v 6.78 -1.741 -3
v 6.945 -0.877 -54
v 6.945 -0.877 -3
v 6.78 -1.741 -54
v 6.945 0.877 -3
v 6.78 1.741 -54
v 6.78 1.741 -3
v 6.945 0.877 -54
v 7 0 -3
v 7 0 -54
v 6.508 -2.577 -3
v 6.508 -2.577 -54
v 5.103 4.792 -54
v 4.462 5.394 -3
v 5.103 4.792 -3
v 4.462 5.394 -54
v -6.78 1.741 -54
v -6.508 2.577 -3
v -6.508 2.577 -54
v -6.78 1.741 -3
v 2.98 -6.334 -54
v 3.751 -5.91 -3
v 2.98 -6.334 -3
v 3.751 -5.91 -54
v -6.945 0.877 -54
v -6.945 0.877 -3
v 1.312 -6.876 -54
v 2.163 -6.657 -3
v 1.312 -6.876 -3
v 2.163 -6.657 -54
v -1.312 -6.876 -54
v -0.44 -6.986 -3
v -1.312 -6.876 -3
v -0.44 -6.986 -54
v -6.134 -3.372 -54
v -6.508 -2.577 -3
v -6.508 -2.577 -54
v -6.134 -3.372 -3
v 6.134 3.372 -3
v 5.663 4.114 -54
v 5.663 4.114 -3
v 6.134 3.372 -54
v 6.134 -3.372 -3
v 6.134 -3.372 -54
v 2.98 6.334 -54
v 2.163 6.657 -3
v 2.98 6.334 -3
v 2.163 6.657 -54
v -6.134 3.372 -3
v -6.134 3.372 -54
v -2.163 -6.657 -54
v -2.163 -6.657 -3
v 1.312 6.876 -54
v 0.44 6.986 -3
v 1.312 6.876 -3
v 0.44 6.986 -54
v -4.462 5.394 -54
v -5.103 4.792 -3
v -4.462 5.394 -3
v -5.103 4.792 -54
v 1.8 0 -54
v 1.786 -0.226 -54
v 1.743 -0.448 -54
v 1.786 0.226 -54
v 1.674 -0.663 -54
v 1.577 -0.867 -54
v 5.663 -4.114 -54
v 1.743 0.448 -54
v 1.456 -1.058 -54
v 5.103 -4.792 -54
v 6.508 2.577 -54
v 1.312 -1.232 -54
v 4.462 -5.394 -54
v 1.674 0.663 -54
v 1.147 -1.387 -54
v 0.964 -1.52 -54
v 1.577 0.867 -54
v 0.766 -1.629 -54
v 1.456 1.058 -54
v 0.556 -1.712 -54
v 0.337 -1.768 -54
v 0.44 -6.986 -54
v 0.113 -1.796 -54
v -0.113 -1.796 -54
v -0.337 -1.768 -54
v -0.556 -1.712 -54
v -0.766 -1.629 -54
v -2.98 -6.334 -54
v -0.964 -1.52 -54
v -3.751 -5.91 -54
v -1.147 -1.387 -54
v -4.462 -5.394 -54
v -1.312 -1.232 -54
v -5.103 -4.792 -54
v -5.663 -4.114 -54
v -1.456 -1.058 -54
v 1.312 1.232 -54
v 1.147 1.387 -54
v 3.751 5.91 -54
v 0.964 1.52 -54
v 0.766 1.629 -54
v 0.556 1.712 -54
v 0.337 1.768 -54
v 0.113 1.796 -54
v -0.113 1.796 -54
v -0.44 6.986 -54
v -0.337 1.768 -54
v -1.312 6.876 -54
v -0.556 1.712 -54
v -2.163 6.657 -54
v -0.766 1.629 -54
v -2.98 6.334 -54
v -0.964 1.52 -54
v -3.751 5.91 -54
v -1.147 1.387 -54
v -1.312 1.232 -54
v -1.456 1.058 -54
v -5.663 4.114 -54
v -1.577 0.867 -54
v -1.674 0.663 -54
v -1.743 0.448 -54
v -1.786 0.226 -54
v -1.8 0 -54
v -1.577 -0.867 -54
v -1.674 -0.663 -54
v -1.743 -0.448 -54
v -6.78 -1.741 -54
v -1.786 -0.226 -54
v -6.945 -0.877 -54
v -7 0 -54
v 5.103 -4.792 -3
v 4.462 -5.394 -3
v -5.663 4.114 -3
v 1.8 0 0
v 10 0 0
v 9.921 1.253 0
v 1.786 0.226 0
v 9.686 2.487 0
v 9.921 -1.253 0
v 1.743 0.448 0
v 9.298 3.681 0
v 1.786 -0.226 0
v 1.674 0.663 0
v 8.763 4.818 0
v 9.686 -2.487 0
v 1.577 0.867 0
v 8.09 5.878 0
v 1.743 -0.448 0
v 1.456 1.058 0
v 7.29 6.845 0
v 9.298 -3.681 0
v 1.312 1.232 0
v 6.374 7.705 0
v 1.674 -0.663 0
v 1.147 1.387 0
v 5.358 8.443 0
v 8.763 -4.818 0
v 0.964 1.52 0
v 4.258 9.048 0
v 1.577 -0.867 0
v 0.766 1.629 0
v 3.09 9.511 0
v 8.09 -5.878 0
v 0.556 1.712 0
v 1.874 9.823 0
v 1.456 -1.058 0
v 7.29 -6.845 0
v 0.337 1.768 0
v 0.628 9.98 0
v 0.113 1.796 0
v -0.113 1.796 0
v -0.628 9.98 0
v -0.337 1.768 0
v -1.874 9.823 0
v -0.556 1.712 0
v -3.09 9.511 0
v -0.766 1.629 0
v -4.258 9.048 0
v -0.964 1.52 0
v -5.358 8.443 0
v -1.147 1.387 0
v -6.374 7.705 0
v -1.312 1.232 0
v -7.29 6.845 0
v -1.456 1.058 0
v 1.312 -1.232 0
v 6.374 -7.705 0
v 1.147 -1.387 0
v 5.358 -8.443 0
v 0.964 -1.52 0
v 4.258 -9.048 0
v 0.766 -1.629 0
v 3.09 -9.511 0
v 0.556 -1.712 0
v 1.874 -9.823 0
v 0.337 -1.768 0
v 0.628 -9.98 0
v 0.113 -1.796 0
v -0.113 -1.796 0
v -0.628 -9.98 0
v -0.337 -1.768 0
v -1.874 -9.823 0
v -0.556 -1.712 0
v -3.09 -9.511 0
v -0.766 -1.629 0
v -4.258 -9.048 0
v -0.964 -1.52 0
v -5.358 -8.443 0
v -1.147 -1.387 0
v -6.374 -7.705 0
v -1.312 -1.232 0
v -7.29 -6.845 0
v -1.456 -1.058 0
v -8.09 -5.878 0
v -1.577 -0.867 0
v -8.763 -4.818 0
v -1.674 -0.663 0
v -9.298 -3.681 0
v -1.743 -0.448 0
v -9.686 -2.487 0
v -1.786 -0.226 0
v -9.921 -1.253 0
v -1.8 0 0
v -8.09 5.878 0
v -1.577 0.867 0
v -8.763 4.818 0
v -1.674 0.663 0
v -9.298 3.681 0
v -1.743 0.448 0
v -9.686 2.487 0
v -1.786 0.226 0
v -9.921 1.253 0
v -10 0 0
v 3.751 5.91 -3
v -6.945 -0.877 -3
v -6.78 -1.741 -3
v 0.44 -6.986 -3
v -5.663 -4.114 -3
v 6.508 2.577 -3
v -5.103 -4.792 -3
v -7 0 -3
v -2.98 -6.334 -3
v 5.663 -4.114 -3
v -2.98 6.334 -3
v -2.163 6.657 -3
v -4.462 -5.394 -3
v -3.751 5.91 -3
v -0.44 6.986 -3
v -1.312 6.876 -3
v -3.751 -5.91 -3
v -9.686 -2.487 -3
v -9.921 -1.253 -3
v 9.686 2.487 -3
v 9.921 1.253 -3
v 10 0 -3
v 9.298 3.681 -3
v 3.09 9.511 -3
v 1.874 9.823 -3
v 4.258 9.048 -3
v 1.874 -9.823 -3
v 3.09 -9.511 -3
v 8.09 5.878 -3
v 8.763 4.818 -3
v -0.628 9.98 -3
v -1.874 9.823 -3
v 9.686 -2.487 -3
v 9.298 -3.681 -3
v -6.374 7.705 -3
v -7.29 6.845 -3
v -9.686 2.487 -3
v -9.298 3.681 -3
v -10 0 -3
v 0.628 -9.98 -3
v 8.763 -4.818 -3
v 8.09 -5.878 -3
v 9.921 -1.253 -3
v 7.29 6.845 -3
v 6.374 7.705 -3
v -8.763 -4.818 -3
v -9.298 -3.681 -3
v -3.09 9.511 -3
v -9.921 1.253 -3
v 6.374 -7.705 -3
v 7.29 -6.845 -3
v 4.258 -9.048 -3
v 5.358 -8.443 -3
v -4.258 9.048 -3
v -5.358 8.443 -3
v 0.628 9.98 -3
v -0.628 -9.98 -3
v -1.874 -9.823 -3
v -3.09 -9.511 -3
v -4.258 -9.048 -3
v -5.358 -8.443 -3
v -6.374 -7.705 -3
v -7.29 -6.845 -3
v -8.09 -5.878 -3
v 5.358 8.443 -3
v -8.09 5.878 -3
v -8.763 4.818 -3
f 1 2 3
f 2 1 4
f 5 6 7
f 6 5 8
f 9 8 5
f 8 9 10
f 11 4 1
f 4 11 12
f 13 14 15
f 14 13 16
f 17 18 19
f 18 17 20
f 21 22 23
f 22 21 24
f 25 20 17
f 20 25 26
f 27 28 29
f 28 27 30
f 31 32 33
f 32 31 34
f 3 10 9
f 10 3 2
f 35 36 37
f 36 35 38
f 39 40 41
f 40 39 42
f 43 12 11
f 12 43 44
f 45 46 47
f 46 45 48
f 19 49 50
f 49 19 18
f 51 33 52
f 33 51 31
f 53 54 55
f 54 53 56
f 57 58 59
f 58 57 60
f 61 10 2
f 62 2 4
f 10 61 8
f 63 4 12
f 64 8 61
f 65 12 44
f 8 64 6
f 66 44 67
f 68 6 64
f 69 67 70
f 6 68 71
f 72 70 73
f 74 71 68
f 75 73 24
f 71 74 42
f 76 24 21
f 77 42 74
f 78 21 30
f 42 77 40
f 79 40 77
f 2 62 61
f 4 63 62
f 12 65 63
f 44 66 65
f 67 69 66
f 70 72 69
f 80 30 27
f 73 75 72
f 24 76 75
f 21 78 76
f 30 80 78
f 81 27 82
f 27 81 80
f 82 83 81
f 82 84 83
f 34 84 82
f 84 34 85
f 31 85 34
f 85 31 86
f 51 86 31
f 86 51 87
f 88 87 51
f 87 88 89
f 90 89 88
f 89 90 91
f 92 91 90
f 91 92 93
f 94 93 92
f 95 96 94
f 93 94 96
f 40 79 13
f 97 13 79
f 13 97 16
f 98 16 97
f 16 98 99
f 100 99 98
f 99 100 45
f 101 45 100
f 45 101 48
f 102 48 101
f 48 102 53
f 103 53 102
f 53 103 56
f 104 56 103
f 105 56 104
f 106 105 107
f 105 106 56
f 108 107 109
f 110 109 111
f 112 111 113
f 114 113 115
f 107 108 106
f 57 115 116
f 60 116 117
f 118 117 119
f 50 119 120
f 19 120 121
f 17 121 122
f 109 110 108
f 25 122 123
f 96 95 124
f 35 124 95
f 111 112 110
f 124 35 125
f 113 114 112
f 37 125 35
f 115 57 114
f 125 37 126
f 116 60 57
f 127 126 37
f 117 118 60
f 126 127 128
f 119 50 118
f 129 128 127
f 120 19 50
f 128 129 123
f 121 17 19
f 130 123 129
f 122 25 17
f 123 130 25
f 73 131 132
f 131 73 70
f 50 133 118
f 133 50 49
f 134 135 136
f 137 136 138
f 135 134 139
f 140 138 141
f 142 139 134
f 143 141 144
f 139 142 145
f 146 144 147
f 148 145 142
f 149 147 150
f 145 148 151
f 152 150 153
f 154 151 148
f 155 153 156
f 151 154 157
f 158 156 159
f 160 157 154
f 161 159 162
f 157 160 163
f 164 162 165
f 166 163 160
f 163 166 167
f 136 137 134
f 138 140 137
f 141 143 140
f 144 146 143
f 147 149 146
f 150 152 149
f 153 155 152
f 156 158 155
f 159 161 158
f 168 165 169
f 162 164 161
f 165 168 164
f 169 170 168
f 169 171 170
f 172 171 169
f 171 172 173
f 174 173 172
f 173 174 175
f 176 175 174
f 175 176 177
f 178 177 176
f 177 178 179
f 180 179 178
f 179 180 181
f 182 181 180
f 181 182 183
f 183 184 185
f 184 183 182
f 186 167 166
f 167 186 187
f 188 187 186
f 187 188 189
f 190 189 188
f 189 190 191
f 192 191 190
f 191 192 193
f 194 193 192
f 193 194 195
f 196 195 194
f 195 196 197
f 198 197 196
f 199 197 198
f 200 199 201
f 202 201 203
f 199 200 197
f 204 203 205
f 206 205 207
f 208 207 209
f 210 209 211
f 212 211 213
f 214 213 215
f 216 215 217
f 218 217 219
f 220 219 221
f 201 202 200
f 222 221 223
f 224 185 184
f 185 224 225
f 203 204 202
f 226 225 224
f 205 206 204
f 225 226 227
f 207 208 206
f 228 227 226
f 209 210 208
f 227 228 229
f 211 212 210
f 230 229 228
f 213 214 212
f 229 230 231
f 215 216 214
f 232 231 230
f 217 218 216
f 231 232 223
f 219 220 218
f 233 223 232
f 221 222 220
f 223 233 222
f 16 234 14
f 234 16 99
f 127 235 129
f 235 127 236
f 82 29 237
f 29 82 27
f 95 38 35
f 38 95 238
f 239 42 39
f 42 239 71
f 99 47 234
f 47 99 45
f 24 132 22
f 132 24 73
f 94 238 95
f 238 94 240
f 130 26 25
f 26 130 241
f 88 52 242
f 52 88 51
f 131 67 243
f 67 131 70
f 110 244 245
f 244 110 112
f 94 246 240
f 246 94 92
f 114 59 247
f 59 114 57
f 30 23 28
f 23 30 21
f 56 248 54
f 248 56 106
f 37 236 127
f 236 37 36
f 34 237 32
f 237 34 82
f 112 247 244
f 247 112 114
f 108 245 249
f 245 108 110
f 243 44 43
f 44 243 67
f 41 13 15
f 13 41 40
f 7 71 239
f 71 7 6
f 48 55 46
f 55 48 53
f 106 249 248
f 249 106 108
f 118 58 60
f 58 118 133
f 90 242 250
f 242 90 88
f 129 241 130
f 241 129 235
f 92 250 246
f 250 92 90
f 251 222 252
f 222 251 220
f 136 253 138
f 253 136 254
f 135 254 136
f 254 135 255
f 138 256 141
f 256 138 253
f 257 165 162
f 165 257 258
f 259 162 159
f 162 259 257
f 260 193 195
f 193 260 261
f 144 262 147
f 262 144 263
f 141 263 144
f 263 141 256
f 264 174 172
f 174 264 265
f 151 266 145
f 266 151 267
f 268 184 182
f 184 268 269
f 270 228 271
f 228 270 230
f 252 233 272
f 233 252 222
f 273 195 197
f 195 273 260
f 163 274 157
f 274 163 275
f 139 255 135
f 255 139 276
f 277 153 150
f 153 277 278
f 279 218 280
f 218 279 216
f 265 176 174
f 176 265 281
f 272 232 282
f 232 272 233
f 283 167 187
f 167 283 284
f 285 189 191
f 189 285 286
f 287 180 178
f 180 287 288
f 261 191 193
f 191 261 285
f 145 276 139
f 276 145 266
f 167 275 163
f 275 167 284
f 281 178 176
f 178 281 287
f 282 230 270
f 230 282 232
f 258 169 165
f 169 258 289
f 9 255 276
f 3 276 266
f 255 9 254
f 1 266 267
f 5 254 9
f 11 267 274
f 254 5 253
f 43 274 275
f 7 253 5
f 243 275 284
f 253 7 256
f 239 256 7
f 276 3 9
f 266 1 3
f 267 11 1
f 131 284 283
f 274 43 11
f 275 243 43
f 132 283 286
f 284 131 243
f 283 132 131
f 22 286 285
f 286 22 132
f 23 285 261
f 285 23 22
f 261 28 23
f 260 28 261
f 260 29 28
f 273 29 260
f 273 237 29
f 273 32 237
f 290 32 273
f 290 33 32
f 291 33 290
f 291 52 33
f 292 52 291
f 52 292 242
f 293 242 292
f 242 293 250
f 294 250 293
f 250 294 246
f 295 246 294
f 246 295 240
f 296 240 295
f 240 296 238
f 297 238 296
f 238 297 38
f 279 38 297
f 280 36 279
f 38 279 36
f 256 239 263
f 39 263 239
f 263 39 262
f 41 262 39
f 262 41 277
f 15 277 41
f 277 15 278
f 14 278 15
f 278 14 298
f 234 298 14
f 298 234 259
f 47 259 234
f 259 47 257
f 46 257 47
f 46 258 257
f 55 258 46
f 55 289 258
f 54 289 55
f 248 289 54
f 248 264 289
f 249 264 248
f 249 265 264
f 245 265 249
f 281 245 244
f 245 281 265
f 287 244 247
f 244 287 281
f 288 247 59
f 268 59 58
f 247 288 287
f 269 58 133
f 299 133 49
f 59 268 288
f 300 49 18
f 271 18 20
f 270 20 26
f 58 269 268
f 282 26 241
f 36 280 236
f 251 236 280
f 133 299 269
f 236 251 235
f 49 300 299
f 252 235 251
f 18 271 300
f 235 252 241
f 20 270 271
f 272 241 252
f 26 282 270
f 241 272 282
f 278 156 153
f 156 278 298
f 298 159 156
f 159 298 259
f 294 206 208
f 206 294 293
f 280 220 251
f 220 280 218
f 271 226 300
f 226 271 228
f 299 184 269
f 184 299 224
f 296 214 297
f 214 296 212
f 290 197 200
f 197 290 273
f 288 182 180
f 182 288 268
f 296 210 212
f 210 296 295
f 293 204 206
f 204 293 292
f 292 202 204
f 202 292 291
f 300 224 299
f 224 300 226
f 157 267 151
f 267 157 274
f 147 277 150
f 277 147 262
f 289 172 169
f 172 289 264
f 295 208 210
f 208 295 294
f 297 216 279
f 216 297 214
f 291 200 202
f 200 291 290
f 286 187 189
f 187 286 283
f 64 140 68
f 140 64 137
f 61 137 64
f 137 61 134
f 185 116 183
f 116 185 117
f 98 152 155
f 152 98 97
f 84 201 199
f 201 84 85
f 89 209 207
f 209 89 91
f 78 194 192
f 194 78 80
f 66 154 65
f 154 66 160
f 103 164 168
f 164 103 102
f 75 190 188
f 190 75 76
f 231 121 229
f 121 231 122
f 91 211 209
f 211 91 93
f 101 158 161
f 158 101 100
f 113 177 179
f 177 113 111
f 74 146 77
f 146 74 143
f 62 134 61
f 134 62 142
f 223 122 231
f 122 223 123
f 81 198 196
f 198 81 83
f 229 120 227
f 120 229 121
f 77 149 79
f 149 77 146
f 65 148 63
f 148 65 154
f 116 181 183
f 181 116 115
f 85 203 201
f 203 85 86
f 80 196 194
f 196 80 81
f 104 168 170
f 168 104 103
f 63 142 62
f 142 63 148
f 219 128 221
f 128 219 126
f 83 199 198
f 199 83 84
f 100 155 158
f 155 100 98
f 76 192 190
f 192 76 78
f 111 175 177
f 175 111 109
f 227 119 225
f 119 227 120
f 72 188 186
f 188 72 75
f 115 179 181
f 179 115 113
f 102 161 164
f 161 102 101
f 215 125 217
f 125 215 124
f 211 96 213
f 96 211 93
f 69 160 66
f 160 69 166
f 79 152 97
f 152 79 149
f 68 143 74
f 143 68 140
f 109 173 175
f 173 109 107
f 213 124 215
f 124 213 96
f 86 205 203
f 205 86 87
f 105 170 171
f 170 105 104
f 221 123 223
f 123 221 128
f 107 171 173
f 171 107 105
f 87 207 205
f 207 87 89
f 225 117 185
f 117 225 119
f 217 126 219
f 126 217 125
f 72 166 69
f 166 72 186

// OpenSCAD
$fn = 50;


difference() {
	union() {
		translate(v = [0, 0, -54.0000000000]) {
			cylinder(h = 54, r = 7.0000000000);
		}
		translate(v = [0, 0, -3.0000000000]) {
			cylinder(h = 3, r = 10.0000000000);
		}
	}
	union() {
		#translate(v = [0, 0, -54]) {
			cylinder(h = 54, r = 1.8000000000);
		}
	}
}
